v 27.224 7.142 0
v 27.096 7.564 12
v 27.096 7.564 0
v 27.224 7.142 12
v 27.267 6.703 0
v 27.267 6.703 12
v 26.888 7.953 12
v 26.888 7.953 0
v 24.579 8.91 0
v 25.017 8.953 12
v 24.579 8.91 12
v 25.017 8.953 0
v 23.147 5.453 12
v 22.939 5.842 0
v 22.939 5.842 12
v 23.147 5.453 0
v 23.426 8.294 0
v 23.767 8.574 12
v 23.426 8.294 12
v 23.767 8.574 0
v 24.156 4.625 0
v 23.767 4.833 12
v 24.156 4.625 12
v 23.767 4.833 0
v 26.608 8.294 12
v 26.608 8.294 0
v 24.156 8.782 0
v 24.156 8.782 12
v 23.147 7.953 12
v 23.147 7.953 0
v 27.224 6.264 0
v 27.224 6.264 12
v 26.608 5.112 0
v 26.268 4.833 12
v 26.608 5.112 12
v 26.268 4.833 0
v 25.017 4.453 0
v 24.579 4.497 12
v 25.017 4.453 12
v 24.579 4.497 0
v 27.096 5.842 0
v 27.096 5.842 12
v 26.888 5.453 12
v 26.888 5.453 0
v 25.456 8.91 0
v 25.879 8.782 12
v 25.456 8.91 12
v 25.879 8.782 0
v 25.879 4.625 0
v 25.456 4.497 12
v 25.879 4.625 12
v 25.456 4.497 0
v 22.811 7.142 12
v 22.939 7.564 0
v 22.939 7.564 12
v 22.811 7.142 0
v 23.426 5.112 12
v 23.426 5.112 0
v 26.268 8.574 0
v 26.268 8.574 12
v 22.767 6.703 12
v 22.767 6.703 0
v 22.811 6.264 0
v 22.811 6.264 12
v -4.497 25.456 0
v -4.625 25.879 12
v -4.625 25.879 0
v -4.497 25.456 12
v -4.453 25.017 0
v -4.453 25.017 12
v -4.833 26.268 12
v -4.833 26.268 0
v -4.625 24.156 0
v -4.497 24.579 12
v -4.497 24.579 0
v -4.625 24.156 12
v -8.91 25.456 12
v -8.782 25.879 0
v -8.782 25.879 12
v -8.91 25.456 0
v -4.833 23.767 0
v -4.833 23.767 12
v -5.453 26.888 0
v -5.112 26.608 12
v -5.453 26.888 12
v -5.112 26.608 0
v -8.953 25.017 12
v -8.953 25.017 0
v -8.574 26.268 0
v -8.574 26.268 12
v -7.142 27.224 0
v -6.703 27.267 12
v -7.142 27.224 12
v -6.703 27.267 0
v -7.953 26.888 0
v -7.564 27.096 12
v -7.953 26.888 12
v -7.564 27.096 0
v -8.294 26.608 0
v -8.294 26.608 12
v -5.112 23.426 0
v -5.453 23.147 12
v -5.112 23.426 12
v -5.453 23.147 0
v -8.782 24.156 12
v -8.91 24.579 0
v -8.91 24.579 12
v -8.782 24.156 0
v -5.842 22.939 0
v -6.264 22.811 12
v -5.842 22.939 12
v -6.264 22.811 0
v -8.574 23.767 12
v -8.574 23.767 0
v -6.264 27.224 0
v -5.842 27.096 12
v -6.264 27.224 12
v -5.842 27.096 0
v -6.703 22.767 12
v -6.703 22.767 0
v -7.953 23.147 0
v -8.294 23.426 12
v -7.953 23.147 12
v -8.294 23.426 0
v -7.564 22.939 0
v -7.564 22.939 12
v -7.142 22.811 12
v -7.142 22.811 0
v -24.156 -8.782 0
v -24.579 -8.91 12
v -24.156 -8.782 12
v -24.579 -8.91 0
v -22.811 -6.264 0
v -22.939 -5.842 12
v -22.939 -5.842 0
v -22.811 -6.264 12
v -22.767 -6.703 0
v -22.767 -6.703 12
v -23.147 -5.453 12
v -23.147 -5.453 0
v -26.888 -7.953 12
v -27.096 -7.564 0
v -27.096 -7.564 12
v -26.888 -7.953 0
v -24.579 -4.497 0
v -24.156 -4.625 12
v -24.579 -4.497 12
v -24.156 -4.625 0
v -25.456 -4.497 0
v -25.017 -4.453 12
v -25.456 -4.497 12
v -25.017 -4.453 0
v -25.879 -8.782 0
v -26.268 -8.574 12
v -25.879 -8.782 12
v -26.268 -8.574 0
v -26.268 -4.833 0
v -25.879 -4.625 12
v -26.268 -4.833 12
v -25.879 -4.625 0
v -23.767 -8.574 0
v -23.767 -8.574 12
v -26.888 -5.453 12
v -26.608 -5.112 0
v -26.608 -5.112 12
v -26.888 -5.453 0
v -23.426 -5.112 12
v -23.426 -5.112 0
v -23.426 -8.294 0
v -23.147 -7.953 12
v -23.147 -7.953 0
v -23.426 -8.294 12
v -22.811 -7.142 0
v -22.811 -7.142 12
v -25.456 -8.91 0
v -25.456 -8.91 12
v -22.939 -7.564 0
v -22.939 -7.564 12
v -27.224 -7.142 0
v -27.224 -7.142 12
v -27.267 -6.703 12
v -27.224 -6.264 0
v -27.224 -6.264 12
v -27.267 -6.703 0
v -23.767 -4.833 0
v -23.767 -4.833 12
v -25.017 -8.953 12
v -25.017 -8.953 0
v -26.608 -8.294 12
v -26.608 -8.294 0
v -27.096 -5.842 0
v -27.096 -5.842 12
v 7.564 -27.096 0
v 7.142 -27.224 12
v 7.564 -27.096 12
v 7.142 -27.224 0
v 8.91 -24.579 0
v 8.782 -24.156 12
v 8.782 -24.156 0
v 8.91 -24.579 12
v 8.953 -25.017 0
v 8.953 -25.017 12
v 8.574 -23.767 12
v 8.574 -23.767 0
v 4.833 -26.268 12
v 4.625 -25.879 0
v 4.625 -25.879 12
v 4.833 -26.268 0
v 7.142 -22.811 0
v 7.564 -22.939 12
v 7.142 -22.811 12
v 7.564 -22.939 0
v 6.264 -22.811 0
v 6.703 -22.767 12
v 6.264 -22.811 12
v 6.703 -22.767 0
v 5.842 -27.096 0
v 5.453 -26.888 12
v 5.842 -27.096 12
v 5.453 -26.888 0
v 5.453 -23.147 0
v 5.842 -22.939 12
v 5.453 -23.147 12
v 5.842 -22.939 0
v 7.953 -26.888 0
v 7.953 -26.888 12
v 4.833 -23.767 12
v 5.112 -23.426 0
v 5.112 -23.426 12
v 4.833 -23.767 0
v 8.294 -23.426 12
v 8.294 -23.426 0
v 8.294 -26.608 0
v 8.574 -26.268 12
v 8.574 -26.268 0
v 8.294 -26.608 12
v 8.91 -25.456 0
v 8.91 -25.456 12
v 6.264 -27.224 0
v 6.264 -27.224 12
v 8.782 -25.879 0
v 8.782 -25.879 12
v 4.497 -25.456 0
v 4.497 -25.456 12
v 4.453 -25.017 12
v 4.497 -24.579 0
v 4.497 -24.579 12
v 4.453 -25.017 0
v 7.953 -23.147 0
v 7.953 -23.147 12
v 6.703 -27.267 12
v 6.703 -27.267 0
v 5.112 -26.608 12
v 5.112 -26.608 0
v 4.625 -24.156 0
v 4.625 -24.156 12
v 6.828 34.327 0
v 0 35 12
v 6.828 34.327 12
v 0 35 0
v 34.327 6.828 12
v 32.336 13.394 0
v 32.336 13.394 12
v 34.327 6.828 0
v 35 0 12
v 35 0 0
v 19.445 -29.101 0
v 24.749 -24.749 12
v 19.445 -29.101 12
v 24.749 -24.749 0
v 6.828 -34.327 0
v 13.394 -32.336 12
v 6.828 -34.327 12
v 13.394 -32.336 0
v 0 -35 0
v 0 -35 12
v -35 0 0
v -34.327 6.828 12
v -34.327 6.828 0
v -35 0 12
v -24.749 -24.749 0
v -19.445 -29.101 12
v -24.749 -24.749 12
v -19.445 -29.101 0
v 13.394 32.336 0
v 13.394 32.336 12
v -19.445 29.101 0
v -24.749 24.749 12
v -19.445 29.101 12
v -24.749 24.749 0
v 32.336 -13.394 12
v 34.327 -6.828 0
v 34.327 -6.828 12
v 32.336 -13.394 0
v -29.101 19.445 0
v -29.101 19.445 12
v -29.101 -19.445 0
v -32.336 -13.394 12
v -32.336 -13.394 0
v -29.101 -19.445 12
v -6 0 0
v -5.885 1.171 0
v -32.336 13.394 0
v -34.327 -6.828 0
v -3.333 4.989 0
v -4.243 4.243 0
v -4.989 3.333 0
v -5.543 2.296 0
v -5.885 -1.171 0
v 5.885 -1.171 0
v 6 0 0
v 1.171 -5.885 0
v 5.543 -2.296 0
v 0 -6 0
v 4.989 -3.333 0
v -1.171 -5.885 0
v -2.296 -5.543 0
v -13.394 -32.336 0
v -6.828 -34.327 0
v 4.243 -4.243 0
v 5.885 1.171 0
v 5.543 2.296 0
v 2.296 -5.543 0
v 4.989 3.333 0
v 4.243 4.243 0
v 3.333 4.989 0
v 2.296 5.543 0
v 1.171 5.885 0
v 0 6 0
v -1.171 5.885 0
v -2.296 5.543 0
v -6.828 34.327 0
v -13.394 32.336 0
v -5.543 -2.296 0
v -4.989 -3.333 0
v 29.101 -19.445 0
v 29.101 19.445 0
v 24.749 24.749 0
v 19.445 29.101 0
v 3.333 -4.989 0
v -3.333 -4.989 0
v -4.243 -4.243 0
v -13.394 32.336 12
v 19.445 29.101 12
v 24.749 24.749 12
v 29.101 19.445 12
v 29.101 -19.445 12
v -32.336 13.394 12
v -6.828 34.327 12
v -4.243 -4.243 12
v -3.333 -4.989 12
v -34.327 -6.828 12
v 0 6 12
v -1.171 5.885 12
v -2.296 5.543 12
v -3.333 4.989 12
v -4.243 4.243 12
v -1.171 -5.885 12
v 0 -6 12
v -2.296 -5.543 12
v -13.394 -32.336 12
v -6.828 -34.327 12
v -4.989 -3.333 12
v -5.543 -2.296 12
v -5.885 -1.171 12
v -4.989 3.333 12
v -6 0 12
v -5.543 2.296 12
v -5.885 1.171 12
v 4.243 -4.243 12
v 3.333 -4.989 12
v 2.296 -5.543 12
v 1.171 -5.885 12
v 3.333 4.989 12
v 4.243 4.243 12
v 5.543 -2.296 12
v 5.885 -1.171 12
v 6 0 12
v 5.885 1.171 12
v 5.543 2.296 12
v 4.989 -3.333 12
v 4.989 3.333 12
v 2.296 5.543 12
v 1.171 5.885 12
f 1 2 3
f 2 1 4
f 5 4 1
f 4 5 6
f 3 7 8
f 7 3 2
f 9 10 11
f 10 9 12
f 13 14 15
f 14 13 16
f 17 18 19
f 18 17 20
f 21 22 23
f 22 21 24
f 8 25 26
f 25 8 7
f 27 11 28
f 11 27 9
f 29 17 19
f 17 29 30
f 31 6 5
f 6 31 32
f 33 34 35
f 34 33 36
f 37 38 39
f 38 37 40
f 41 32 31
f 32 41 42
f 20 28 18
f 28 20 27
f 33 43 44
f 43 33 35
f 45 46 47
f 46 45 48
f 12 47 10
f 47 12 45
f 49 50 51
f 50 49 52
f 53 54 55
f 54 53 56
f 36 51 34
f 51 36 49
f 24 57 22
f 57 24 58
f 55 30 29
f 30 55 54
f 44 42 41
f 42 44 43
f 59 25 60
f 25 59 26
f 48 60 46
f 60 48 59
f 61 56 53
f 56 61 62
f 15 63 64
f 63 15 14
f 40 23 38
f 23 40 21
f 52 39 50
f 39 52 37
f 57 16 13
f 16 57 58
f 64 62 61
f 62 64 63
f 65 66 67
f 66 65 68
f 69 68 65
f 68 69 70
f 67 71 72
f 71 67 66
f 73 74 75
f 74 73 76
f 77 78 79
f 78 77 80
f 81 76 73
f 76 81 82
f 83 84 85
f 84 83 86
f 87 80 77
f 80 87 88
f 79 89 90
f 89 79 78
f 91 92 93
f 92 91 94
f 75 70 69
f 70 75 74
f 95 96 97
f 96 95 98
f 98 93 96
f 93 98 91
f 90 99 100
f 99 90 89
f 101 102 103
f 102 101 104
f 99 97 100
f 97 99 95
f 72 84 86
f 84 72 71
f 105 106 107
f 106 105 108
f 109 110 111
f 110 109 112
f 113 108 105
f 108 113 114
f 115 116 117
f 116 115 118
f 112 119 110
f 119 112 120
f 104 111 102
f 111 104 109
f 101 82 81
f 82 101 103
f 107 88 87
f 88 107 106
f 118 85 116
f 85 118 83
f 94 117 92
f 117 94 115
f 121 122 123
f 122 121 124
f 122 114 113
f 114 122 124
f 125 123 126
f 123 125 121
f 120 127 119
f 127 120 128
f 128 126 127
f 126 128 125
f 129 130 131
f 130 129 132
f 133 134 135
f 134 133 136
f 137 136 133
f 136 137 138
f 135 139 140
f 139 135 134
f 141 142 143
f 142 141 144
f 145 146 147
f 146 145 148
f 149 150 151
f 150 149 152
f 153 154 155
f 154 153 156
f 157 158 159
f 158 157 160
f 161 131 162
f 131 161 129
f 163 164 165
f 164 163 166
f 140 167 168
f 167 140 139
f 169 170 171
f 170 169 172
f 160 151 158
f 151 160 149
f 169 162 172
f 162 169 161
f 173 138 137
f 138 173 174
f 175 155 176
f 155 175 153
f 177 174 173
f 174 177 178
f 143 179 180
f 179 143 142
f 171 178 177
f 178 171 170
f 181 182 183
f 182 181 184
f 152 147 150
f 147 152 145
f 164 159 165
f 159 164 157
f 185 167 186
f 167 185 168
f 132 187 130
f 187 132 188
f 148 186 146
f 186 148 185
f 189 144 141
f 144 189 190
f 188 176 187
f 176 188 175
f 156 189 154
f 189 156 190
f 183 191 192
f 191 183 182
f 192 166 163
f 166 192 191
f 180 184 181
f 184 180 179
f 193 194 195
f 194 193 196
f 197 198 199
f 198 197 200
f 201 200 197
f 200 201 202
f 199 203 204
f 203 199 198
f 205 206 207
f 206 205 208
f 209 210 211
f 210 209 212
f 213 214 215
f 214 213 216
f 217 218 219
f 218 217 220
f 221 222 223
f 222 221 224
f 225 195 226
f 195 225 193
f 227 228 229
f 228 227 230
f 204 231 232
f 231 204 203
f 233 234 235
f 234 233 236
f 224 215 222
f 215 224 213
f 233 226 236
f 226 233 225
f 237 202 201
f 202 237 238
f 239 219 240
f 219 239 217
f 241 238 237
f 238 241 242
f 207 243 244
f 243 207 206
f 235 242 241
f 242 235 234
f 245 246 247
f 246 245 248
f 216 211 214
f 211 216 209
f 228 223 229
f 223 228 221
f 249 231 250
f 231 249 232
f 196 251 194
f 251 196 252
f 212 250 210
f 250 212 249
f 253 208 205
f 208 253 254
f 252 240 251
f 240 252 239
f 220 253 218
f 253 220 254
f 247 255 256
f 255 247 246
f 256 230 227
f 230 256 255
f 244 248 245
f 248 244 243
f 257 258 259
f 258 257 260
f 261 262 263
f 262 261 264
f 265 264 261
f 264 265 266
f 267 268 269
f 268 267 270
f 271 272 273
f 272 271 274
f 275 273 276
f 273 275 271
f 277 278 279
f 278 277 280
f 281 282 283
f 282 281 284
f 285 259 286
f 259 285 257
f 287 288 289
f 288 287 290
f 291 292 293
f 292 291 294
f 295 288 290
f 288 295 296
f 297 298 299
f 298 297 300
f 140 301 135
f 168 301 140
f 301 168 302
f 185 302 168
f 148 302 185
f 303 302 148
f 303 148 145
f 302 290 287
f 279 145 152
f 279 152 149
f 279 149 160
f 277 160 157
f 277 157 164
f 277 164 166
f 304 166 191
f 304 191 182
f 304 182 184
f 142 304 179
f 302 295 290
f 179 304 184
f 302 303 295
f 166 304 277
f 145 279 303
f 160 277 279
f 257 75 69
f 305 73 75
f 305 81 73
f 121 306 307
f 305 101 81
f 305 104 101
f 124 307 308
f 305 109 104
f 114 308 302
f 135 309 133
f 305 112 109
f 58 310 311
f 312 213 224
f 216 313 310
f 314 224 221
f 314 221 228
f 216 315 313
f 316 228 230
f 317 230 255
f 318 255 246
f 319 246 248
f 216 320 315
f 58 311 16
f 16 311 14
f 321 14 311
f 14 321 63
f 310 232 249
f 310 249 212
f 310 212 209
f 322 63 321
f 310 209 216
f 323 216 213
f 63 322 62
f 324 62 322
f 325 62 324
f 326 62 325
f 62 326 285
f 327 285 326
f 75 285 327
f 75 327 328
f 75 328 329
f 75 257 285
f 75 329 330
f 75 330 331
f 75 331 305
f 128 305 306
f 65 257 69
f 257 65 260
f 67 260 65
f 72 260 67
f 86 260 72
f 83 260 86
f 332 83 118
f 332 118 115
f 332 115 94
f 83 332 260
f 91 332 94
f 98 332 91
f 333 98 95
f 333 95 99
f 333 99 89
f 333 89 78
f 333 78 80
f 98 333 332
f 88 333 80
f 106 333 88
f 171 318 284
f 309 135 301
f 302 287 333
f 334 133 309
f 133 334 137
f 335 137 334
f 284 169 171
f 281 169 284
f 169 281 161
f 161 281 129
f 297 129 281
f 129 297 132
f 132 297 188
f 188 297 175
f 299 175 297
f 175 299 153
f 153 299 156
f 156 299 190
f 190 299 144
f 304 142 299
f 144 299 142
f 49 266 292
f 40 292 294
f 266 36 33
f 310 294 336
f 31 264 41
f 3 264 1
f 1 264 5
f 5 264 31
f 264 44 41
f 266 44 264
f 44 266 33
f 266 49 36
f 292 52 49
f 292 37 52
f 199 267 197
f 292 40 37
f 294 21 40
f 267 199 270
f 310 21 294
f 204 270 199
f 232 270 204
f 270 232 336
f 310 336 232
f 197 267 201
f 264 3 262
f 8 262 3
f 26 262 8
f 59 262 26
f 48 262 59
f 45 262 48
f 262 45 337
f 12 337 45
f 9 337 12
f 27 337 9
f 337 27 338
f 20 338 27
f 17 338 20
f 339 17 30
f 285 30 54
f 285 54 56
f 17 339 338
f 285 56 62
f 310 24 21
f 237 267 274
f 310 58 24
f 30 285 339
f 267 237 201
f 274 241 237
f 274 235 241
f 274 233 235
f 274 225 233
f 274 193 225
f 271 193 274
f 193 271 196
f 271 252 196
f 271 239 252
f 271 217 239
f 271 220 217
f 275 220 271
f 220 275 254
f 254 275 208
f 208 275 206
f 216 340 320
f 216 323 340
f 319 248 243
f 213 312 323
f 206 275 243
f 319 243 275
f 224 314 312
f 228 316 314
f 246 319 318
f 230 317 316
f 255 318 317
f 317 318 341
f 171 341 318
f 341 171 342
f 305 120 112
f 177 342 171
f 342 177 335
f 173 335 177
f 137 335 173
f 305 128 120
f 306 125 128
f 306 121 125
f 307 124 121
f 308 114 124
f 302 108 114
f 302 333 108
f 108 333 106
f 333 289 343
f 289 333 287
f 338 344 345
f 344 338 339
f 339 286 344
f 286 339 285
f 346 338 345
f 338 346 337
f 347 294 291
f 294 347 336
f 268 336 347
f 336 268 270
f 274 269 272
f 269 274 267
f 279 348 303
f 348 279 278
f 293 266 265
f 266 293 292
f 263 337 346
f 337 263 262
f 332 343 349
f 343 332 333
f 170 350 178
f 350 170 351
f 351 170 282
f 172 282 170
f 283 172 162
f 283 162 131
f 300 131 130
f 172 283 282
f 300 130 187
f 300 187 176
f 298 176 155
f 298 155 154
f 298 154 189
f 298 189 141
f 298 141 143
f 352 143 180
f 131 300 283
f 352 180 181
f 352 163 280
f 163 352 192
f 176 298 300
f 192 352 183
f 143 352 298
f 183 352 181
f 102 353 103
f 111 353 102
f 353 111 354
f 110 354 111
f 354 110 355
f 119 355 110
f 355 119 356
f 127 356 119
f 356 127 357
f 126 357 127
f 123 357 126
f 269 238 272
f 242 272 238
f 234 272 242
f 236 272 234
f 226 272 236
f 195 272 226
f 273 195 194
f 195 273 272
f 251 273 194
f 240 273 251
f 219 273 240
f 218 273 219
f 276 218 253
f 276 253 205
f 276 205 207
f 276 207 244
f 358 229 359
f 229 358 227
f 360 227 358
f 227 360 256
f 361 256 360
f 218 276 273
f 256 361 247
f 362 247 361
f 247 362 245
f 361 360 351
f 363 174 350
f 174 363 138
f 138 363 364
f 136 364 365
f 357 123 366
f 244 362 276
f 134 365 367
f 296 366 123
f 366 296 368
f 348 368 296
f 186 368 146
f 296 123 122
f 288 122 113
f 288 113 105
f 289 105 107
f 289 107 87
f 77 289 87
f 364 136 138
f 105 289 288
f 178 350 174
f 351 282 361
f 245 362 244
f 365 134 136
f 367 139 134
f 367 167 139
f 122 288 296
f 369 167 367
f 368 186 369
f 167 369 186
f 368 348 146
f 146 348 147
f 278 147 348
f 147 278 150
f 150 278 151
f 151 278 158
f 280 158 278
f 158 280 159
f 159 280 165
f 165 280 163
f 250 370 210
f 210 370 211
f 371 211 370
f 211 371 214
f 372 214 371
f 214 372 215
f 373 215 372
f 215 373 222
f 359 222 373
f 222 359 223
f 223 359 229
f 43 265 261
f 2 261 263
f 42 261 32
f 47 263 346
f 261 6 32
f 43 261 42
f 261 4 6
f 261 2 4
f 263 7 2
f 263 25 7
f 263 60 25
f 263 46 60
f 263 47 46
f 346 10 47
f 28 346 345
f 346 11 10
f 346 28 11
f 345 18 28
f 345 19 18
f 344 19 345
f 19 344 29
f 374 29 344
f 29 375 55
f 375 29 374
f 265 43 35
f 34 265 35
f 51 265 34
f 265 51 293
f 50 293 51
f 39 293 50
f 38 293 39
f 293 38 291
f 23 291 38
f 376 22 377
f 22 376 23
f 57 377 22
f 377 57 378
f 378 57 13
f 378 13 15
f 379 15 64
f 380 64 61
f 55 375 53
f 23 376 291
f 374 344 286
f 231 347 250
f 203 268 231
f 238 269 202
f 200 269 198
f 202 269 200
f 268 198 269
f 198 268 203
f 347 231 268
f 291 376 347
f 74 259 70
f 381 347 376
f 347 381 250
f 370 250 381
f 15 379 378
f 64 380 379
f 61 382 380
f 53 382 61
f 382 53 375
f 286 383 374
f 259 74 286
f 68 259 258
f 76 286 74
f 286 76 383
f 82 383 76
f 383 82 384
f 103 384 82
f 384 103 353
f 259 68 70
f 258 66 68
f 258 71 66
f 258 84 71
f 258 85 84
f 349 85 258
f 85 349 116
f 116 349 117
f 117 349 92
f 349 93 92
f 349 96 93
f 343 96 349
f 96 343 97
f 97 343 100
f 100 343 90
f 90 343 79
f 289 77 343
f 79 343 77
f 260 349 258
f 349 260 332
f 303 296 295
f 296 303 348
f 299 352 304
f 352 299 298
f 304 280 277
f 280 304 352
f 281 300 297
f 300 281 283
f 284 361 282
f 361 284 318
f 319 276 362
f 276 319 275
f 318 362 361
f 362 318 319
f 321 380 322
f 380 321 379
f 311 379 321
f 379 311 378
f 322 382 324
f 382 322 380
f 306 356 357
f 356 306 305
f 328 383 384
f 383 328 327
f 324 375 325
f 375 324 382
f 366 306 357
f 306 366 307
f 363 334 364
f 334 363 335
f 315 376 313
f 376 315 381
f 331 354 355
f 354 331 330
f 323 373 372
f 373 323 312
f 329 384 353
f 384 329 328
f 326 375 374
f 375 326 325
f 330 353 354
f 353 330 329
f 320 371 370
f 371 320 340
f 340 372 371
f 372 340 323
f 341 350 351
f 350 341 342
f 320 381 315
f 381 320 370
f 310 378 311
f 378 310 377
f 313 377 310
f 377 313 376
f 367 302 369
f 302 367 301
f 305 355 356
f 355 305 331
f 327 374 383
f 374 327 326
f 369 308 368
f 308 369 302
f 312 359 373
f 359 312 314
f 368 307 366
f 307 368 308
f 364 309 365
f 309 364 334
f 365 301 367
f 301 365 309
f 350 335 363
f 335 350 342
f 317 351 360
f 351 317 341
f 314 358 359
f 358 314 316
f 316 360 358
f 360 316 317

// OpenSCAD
$fn = 32;

// ----------------------------------------------------------------------
// Flange Ø70 x 12
// 4 holes on a Ø51.8 bolt circle, bolted joints
// ----------------------------------------------------------------------

// --- parameters (mm) ---
flange_d = 70;   // outside diameter of the flange
thickness = 12;  // flange thickness
holes = 4;       // number of bolt holes
pcd = 51.8;      // bolt circle diameter
start_deg = 15;  // angle of the first hole, from +X
hole_d = 4.5;    // bolt hole diameter
bore_d = 12;     // central through bore
hub_d = 24;      // hub outside diameter
hub_h = 0;       // hub height above the flange face (0 = no hub)

// --- derived feature positions (mm) ---
height = thickness + hub_h;  // = 12   overall height of the part
pcd_r = pcd / 2;             // = 25.9   bolt circle radius
hole_step = 360 / holes;     // = 90   angular pitch
feature_centers = [
  [pcd_r * cos(start_deg + 0 * hole_step), pcd_r * sin(start_deg + 0 * hole_step)],
  [pcd_r * cos(start_deg + 1 * hole_step), pcd_r * sin(start_deg + 1 * hole_step)],
  [pcd_r * cos(start_deg + 2 * hole_step), pcd_r * sin(start_deg + 2 * hole_step)],
  [pcd_r * cos(start_deg + 3 * hole_step), pcd_r * sin(start_deg + 3 * hole_step)]
];   // bolt hole centres on the pitch circle

// flange disc, every hole and the bore cut straight through
difference() {
  union() {
    cylinder(d = flange_d, h = thickness);
  }
  translate([0, 0, -1]) cylinder(d = bore_d, h = height + 2);  // bore, through
  for (centre = feature_centers)
    translate([centre[0], centre[1], -1]) cylinder(d = hole_d, h = thickness + 2);
}
